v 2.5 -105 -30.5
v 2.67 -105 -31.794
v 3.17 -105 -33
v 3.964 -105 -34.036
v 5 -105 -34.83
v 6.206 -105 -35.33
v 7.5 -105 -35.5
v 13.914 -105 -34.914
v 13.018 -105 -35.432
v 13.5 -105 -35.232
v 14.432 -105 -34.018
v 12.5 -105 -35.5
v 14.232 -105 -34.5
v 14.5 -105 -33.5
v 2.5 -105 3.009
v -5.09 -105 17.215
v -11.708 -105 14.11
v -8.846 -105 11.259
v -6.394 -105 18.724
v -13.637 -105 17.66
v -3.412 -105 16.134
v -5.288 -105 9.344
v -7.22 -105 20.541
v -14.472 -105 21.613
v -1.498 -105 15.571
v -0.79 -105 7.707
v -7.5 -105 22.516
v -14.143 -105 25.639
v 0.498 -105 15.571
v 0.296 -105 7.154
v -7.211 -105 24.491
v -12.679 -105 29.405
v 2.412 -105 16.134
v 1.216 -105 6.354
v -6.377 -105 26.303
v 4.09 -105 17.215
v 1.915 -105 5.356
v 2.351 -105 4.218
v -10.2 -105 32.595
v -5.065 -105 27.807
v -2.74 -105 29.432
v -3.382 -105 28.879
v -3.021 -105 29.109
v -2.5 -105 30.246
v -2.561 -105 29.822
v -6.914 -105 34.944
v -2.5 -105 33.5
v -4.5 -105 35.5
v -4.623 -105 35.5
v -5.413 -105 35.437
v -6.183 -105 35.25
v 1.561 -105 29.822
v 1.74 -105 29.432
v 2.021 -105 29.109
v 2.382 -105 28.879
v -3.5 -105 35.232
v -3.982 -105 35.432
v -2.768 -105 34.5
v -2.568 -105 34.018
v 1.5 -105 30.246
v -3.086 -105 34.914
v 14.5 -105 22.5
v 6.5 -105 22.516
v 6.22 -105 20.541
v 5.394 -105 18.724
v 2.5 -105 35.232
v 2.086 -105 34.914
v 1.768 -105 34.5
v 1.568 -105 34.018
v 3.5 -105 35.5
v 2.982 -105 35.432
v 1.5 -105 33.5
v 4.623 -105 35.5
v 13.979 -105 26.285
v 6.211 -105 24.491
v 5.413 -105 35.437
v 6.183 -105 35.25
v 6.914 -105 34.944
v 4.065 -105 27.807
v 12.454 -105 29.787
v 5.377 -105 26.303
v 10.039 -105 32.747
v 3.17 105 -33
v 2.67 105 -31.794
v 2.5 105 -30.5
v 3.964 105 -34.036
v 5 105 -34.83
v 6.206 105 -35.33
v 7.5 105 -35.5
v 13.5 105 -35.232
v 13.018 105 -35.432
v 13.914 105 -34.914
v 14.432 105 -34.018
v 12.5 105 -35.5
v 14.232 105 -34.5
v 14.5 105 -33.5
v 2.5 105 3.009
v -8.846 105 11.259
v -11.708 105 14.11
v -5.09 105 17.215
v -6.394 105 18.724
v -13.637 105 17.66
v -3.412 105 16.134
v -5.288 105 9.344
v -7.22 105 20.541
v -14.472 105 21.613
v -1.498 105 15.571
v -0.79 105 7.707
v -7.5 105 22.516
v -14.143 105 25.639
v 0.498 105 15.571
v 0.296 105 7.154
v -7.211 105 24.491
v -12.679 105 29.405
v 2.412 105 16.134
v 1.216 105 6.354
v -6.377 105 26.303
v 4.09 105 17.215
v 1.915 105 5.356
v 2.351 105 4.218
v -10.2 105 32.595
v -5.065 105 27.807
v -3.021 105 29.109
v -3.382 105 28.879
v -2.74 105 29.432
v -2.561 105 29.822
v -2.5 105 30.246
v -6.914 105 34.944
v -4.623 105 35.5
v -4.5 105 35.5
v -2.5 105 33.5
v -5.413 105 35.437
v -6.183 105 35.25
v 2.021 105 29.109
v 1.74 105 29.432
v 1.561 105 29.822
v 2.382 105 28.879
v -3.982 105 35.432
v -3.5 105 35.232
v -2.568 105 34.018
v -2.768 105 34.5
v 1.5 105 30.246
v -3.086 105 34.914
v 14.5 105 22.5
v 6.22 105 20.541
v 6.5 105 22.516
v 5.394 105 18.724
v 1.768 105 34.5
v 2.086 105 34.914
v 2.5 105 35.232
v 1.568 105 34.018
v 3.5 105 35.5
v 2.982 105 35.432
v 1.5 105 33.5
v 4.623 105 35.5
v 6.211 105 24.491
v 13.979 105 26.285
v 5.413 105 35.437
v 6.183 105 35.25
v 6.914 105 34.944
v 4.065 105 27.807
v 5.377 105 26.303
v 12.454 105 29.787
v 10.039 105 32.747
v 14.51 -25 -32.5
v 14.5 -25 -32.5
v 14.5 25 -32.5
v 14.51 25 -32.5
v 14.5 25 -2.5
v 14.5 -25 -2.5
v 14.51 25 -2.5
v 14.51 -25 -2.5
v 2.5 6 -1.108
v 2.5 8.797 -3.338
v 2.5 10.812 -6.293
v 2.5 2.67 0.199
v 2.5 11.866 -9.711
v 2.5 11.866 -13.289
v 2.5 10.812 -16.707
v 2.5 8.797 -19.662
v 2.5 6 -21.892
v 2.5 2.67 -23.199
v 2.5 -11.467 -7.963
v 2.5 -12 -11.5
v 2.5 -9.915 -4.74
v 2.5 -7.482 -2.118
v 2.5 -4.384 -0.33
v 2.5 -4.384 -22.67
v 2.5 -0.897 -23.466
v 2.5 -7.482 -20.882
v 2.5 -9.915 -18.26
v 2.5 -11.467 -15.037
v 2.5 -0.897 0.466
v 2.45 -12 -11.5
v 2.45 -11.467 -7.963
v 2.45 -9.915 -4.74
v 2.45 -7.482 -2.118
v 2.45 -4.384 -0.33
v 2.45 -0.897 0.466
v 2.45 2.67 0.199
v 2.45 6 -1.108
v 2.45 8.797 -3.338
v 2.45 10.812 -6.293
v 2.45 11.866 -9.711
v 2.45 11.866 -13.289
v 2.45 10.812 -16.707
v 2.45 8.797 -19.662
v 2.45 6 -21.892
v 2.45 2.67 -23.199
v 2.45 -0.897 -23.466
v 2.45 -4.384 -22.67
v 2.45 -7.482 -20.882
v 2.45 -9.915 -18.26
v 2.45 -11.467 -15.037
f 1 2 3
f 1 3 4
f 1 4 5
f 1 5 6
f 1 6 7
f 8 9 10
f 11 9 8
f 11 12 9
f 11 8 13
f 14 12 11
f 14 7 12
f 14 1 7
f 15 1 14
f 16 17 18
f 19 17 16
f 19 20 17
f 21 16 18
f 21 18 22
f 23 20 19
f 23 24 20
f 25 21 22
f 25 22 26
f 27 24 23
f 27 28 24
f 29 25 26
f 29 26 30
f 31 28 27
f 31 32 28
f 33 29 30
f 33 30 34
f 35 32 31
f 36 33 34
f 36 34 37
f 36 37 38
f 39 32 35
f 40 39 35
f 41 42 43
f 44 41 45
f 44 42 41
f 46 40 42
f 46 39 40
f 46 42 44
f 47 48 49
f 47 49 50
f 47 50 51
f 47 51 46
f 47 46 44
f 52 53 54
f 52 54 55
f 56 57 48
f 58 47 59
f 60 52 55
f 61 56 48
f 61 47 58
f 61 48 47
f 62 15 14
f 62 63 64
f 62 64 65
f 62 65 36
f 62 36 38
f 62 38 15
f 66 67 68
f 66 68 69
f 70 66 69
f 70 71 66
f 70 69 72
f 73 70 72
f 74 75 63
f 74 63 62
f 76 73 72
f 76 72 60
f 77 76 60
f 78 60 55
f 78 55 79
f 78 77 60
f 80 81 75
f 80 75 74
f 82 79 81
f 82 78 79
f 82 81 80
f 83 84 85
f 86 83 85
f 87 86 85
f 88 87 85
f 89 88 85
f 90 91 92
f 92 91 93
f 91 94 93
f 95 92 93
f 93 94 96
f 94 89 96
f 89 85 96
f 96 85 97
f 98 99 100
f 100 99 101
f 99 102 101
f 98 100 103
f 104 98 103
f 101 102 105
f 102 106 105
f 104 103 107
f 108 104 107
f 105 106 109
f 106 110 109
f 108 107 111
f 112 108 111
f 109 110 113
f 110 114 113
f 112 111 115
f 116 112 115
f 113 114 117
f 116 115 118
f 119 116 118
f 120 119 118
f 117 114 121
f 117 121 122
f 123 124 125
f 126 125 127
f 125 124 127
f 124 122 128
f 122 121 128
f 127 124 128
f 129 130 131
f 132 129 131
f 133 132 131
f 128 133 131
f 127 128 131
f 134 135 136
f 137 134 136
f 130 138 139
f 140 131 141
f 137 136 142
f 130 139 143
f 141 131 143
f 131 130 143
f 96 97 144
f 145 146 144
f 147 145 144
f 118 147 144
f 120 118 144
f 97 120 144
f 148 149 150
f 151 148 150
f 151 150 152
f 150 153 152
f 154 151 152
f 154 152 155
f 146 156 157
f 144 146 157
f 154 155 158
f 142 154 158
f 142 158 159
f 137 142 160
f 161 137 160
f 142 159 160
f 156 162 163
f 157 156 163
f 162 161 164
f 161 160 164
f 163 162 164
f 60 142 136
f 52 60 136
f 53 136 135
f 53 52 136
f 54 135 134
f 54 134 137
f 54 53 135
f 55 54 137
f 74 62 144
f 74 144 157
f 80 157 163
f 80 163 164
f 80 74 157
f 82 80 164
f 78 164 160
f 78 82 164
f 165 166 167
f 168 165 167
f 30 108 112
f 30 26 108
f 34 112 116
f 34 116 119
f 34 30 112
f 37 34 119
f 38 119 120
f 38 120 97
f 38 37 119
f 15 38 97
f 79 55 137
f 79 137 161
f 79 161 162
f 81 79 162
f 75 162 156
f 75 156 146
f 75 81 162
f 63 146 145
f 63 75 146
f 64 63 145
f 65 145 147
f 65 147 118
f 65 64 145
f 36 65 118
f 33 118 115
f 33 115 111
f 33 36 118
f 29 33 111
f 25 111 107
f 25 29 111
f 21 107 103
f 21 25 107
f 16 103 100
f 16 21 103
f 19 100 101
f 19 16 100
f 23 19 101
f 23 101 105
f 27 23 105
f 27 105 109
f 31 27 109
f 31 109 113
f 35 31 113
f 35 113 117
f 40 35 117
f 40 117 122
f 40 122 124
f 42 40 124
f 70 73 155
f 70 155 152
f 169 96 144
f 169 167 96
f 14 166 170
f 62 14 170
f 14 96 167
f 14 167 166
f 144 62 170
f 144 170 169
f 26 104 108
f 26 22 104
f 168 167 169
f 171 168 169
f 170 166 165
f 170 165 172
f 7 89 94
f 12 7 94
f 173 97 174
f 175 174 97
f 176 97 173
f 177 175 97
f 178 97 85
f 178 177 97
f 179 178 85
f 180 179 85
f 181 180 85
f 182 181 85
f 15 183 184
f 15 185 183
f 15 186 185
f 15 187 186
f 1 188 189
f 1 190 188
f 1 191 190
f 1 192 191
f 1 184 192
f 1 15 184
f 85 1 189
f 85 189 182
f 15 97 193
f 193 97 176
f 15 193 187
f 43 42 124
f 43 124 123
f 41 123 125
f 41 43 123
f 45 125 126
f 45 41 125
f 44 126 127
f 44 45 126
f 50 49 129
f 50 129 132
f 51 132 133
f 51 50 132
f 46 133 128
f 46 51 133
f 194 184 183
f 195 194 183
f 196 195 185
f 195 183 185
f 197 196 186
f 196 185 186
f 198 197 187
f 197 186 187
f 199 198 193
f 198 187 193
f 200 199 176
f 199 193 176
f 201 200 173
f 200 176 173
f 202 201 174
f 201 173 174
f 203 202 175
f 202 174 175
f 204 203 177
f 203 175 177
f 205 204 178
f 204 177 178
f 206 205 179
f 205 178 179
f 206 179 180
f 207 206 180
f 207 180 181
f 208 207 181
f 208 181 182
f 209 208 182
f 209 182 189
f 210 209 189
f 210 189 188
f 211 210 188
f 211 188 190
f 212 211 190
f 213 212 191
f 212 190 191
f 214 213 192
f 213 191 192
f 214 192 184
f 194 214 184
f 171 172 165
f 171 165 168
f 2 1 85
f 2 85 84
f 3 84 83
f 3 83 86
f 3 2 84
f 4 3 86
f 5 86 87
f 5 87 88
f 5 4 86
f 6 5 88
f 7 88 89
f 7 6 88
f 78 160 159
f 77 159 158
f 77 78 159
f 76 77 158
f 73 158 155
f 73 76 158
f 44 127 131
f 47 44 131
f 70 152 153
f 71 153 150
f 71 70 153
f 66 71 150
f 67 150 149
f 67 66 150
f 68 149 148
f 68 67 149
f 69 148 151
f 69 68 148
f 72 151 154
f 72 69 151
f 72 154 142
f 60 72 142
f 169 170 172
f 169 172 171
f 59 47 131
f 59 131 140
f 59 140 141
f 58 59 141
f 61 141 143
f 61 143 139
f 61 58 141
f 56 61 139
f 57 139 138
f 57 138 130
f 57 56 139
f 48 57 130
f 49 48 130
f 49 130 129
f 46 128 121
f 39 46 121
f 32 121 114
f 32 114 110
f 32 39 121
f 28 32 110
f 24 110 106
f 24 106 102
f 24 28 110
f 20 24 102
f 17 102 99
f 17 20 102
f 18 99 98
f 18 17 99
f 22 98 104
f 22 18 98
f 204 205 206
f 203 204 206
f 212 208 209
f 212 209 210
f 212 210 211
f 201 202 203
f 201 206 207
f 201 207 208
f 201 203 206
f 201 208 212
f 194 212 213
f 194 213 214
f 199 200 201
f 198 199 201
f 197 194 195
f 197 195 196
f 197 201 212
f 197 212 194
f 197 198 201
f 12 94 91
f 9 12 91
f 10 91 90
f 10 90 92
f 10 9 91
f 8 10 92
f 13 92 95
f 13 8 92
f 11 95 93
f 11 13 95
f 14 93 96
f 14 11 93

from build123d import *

# Parameters (mm, degrees)
F1_DEPTH = 105
F2_R     = 12
F3_DEPTH = 0.05
F4_W     = 50
F4_H     = 30
F5_DEPTH = 0.01


# Not quite as in the source:
# - ends of sketch curves that miss each other by under 0.0002 mm in the source are joined


with BuildPart() as f1:
    # F0 (on Front) → F1 (new body, symmetric)
    with BuildSketch(Plane.XZ):
        with BuildLine():
            Line((2.4999997663, 3.0085625581), (2.4999997663, -30.5))
            ThreePointArc((2.4999997663, -30.5), (3.9644658603, -34.0355339059), (7.4999997663, -35.5))
            Line((7.4999997663, -35.5), (12.4999997663, -35.5))
            ThreePointArc((12.4999997663, -35.5), (13.9142133287, -34.9142135624), (14.4999997663, -33.5))
            Line((14.4999997663, -33.5), (14.4999997663, 22.4999994828))
            ThreePointArc((14.4999997663, 22.4999994828), (12.4539129776, 29.7872458033), (6.9137199183, 34.9444437777))
            ThreePointArc((6.9137199183, 34.9444437777), (5.8016169865, 35.3591259101), (4.6231056877, 35.4999993303))
            Line((4.6231056877, 35.4999993303), (3.4999997663, 35.4999993303))
            ThreePointArc((3.4999997663, 35.4999993303), (2.0857862039, 34.9142128927), (1.4999997663, 33.4999993303))
            Line((1.4999997663, 33.4999993303), (1.4999997663, 30.2459664828))
            ThreePointArc((1.4999997663, 30.2459664828), (1.7397477835, 29.4324771221), (2.3823530195, 28.8790310431))
            ThreePointArc((2.3823530195, 28.8790310431), (-0.5000000985, 15.4999997293), (-3.3823532363, 28.8790310342))
            ThreePointArc((-3.3823532363, 28.8790310342), (-2.7397478169, 29.4324771961), (-2.4999997997, 30.2459665567))
            Line((-2.4999997997, 30.2459665567), (-2.4999997997, 33.5))
            ThreePointArc((-2.4999997997, 33.5), (-3.0857862373, 34.9142132361), (-4.4999997997, 35.4999996738))
            Line((-4.4999997997, 35.4999996738), (-4.6231058319, 35.4999996738))
            ThreePointArc((-4.6231058319, 35.4999996738), (-5.8016171306, 35.3591262536), (-6.9137200625, 34.9444441212))
            ThreePointArc((-6.9137200625, 34.9444441212), (-14.4718653147, 21.6128794539), (-5.288282, 9.344303))
            Line((-5.288282, 9.344303), (-0.7898995061, 7.707025658))
            ThreePointArc((-0.7898995061, 7.707025658), (1.5957599911, 5.8764447351), (2.4999997663, 3.0085625581))
        make_face()
    extrude(amount=F1_DEPTH, both=True)

    # F2 (on face) → F3 (join)
    with BuildSketch(Plane(origin=(2.4999997663, 0, 0), x_dir=(0, -1, 0), z_dir=(-1, 0, 0))):
        with Locations((0, -11.5)):
            Circle(F2_R)
    extrude(amount=F3_DEPTH)

    # F4 (on face) → F5 (join)
    with BuildSketch(Plane.YZ.offset(14.4999997663)):
        with Locations((0, -17.5000005172)):
            Rectangle(F4_W, F4_H)
    extrude(amount=F5_DEPTH)


solid = f1.part
